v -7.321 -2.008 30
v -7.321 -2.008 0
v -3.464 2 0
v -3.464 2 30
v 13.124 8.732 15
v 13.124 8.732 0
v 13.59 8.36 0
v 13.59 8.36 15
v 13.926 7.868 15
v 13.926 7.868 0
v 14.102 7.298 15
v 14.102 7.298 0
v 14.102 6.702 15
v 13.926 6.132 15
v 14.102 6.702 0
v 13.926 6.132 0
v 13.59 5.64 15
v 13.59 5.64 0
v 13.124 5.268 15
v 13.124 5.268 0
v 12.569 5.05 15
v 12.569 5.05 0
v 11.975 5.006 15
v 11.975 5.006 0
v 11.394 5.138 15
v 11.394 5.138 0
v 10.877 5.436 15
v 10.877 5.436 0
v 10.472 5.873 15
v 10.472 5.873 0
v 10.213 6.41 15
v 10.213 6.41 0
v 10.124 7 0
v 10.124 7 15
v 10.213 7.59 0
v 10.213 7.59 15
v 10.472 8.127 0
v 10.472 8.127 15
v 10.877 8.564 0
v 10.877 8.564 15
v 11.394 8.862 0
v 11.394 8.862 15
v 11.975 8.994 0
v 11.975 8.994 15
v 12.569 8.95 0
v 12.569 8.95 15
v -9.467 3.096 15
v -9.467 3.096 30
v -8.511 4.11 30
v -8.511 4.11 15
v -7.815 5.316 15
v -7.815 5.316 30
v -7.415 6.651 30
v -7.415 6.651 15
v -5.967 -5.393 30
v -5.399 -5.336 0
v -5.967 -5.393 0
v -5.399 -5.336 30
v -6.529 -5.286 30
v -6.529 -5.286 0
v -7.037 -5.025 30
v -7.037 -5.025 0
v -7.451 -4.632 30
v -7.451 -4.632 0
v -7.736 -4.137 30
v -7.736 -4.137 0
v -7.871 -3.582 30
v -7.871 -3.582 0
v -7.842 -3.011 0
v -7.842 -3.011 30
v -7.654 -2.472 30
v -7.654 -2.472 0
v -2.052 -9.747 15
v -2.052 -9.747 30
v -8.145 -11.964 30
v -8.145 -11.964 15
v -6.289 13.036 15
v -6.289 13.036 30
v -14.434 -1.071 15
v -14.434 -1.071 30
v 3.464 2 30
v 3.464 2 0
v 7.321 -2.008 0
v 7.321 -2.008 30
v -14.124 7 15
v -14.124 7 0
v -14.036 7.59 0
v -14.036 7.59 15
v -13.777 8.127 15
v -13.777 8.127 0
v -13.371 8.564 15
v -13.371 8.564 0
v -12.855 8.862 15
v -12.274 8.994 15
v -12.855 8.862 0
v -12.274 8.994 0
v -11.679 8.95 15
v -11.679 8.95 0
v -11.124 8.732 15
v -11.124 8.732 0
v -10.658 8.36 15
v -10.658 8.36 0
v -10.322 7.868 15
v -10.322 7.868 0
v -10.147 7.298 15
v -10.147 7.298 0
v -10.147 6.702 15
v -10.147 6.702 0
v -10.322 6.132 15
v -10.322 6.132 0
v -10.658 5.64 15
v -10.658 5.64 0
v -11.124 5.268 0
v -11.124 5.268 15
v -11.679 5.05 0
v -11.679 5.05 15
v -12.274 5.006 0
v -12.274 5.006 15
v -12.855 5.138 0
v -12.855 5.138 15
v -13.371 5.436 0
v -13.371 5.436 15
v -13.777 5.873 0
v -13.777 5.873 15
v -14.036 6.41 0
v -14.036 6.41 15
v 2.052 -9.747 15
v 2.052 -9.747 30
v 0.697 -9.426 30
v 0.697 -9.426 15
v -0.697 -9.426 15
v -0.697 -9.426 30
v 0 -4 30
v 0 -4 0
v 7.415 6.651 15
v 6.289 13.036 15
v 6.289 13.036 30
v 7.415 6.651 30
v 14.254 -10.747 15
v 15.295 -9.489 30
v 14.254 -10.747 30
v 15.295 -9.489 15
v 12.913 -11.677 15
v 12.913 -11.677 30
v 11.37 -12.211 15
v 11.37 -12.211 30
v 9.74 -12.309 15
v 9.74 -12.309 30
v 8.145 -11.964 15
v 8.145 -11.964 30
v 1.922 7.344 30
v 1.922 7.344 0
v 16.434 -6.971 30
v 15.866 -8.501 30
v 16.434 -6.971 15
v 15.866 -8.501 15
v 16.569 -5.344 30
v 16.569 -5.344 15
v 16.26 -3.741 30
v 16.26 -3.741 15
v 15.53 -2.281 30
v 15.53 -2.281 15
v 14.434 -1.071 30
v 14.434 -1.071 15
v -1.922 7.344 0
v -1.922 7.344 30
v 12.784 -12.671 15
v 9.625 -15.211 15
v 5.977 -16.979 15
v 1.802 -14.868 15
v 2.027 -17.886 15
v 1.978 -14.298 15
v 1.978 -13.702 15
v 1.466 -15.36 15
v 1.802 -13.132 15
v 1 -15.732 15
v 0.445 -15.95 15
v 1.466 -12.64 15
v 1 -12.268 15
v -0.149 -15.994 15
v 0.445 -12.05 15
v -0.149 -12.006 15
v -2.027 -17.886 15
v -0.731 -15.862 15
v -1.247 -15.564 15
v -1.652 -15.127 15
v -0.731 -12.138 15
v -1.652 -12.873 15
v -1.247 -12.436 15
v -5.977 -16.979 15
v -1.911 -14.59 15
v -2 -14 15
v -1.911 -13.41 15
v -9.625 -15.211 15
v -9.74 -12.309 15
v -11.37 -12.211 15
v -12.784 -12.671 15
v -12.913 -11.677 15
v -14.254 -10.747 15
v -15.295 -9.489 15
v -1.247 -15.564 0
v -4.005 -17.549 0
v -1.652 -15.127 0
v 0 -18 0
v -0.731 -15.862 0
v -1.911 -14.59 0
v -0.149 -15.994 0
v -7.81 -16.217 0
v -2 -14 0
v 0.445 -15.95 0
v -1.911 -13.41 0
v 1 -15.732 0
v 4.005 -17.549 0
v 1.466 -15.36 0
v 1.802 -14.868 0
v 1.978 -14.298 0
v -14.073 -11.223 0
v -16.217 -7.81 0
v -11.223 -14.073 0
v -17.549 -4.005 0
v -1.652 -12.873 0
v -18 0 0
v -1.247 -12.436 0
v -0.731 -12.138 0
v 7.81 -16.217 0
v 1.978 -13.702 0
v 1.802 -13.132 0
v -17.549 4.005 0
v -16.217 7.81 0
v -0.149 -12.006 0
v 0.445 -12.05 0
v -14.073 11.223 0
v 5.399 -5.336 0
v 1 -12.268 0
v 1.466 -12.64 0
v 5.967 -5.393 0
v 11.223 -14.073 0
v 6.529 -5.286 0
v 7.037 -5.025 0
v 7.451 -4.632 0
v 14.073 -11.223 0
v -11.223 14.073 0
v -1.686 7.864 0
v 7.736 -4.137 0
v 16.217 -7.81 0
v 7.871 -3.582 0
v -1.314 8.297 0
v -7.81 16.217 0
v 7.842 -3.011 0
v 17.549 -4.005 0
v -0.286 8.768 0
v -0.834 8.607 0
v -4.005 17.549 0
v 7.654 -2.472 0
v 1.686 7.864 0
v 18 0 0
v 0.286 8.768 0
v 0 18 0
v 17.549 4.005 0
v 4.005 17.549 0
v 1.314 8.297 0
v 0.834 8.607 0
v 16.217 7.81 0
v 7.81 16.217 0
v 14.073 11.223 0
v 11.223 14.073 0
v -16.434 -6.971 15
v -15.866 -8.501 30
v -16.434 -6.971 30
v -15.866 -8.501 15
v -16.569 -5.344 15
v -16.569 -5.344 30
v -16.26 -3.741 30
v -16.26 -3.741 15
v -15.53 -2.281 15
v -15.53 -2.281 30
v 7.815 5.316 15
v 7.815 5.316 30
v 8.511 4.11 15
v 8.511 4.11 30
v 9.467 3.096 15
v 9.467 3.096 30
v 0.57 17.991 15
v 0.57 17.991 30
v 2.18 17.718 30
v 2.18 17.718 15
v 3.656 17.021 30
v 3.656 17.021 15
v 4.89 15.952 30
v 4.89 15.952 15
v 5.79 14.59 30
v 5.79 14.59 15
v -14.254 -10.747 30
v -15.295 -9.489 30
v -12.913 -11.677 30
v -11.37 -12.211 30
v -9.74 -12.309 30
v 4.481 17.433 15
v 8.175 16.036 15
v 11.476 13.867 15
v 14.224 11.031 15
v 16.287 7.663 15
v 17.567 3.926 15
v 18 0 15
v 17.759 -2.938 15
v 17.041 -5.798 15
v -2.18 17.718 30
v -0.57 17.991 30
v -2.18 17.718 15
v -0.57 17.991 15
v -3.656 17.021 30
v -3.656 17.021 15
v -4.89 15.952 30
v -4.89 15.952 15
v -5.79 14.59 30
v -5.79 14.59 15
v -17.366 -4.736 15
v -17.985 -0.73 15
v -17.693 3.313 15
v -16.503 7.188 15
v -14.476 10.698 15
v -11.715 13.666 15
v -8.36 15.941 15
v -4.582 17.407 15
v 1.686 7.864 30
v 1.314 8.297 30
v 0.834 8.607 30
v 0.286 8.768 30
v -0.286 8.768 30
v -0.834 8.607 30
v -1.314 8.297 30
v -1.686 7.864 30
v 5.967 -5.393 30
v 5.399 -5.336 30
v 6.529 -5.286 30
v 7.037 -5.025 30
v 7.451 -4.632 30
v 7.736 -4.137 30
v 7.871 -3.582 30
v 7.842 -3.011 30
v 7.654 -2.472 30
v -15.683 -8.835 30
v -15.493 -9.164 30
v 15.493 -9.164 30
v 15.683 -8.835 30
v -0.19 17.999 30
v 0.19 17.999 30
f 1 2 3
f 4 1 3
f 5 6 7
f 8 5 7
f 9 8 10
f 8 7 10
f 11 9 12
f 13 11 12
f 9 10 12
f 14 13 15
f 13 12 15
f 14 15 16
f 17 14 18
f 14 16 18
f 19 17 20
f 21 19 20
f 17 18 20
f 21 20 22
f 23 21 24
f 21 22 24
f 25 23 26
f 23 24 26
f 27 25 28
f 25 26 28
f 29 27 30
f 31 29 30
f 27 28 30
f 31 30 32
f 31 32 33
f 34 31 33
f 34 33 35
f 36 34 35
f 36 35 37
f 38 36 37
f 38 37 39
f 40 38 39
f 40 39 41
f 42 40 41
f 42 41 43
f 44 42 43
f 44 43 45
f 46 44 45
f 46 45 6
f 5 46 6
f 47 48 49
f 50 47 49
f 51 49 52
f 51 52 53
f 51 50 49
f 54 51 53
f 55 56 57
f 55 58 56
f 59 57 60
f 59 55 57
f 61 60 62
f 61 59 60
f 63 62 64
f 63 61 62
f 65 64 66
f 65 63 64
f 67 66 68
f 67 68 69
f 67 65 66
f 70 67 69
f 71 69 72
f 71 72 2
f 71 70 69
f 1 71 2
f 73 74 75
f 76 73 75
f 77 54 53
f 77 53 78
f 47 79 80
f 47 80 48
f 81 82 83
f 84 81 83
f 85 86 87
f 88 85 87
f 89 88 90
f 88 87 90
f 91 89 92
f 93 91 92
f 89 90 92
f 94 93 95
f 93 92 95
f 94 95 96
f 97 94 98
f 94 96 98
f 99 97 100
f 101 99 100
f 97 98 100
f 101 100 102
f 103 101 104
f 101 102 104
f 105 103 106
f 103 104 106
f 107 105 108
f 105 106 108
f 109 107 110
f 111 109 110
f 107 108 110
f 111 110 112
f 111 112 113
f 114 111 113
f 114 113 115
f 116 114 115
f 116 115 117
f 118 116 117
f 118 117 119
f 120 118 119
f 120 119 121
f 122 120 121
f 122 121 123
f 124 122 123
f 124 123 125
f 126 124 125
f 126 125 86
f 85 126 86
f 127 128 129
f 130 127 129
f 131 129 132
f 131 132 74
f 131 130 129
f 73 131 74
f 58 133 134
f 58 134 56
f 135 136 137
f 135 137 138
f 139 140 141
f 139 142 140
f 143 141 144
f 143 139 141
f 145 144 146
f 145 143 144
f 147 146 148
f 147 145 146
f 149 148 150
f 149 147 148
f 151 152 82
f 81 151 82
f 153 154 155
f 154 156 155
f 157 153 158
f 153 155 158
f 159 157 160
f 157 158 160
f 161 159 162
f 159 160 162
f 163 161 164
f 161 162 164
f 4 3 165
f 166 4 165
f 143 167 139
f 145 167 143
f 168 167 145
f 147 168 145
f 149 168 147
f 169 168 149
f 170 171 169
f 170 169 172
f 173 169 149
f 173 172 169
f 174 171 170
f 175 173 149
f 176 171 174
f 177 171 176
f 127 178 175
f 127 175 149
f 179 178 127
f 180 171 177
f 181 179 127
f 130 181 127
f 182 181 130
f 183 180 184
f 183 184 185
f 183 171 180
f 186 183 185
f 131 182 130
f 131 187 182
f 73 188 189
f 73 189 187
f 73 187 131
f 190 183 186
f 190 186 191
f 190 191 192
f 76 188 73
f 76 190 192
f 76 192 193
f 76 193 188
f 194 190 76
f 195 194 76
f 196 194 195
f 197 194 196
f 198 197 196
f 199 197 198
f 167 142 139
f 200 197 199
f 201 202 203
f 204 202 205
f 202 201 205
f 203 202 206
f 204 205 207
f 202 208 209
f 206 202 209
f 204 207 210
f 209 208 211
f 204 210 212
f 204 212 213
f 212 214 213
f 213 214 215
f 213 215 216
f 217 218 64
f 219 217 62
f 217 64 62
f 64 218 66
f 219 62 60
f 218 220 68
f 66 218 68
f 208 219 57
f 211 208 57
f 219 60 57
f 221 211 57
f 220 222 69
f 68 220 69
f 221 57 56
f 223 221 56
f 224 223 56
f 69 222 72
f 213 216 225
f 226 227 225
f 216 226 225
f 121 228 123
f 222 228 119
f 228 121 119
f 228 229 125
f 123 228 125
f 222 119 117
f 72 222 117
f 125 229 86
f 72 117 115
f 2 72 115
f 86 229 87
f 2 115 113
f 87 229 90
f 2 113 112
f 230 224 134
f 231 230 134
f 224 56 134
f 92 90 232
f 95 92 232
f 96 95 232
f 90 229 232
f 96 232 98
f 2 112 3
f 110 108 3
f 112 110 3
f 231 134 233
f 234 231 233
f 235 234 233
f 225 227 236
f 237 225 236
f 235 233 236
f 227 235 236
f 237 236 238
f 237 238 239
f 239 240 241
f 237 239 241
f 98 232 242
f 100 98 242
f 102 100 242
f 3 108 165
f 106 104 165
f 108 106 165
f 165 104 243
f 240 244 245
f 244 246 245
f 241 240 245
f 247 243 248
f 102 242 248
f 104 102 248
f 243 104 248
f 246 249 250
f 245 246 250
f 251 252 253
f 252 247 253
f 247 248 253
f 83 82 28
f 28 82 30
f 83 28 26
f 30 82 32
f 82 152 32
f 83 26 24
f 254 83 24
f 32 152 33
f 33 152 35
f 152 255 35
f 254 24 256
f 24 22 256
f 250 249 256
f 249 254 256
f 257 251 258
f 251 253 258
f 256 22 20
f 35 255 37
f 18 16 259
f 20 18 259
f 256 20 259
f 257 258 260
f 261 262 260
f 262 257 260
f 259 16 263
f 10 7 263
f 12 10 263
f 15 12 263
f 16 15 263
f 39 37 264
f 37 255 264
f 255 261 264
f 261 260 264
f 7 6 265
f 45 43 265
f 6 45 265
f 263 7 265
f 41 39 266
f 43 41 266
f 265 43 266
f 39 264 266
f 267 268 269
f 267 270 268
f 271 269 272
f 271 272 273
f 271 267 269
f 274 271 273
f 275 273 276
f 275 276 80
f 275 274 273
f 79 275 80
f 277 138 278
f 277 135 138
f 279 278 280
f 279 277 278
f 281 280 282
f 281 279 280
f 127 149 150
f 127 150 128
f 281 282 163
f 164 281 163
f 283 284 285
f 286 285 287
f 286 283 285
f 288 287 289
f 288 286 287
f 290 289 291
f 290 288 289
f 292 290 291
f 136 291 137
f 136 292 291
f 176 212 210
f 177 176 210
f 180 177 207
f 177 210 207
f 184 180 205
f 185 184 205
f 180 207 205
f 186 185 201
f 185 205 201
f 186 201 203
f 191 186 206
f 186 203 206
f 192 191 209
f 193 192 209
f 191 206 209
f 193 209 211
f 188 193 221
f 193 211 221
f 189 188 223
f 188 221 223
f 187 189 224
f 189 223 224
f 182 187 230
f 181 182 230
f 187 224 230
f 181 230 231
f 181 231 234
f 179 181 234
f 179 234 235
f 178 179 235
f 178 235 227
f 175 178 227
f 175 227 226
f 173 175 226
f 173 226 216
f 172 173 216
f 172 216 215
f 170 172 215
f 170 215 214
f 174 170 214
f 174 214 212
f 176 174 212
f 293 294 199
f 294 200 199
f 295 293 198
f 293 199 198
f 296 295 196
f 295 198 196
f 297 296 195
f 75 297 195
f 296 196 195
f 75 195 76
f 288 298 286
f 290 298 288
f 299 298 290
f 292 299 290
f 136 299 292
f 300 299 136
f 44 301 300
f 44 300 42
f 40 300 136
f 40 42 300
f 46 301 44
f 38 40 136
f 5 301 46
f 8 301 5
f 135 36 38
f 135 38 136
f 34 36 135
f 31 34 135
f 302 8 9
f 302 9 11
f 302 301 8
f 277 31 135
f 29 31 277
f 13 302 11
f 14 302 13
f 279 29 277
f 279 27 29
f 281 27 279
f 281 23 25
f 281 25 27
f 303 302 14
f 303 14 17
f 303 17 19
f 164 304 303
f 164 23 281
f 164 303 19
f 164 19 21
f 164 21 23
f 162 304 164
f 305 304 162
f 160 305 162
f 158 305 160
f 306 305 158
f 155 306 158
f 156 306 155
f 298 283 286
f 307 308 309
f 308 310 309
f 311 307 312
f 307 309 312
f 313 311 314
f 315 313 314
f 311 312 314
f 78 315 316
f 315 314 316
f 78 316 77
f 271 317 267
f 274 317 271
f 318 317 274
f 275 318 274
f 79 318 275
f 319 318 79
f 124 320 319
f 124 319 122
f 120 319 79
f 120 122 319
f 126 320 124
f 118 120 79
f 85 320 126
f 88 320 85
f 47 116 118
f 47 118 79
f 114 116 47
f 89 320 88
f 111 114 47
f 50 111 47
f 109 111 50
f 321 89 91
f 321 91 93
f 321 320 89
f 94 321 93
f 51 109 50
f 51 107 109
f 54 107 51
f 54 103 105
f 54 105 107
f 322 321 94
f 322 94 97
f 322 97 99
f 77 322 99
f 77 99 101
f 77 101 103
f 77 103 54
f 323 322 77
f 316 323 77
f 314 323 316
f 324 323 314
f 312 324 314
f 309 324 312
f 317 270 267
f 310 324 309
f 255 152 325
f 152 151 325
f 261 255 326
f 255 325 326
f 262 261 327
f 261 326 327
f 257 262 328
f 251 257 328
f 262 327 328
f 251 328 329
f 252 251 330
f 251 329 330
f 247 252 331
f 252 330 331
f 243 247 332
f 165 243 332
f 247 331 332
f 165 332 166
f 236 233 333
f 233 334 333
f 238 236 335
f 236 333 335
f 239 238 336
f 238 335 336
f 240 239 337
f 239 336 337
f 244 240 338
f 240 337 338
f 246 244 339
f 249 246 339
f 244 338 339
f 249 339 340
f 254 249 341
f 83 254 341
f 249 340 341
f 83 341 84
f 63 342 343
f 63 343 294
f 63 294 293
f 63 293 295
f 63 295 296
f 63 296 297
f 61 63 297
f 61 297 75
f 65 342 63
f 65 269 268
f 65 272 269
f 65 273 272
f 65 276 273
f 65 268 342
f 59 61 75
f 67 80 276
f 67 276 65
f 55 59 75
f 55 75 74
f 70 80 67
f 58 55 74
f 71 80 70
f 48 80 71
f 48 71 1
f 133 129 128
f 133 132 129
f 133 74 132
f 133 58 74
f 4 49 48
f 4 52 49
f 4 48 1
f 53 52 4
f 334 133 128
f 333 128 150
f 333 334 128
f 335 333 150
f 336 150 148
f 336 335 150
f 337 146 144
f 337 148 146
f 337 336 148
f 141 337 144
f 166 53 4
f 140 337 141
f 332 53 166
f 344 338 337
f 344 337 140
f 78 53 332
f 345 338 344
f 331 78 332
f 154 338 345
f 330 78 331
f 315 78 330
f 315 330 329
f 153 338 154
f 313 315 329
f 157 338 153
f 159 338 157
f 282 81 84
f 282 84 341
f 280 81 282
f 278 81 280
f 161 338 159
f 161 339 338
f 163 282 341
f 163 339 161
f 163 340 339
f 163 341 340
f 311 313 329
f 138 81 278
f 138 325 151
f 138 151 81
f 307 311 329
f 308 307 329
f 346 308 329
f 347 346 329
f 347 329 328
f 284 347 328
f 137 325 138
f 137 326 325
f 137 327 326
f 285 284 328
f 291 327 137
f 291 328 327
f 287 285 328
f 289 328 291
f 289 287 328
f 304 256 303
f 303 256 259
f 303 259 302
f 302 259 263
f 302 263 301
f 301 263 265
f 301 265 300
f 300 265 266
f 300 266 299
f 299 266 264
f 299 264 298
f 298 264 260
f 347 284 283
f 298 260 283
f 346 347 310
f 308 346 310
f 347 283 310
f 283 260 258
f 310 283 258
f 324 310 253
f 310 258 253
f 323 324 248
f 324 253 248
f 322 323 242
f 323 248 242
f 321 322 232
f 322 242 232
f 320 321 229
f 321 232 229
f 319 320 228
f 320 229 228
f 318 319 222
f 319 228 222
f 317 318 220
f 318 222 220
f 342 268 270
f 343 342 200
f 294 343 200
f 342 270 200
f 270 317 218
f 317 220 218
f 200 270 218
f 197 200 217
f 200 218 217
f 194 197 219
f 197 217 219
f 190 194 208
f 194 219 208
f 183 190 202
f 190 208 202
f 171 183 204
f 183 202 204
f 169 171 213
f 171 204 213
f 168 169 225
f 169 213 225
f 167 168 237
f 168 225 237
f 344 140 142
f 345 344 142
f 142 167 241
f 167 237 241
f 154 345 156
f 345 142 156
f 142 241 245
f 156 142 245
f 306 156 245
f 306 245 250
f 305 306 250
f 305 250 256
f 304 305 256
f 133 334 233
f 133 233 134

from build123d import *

# Parameters (mm, degrees)
SKETCH1_R                = 18
BOSS_EXTRUDE1_DEPTH      = 30
SKETCH2_R                = 2
CUT_EXTRUDE1_DEPTH       = 40
CUT_EXTRUDE2_DEPTH       = 15
FILLET2_R                = 6
CIRPATTERN3_COUNT        = 3
FILLET2_OF_CIRPATTERN3_R = 6
CUT_EXTRUDE3_START       = -30
CUT_EXTRUDE3_DEPTH       = 30
FILLET3_R                = 2


with BuildPart() as part:
    # Sketch1 → Boss-Extrude1 (new body)
    with BuildSketch(Plane.XY):
        Circle(SKETCH1_R)
    extrude(amount=BOSS_EXTRUDE1_DEPTH)

    # Sketch2 → Cut-Extrude1 (cut)
    with BuildSketch(Plane(origin=(0, 0, 0), x_dir=(-1, 0, 0), z_dir=(0, 0, -1))):
        with Locations((12.124355653, 7)):
            Circle(SKETCH2_R)
    cut_extrude1 = extrude(amount=-CUT_EXTRUDE1_DEPTH, mode=Mode.SUBTRACT)

    # Sketch3 → Cut-Extrude2 (cut)
    with BuildSketch(Plane.XY.offset(30)):
        Polygon((-15.686533479, 14.830127019), (-20.686533479, 6.169872981), (-17.60824379, -3.734936498), (-7.794228634, 4.5), (-5.569572007, 17.116654687), align=None)
    cut_extrude2 = extrude(amount=-CUT_EXTRUDE2_DEPTH, mode=Mode.SUBTRACT)

    # Fillet2
    fillet2_edges = [part.edges().sort_by_distance(p)[0] for p in [
        (-7.794228634, 4.5, 22.5),
        (-17.60824379, -3.734936498, 22.5),
        (-5.569572007, 17.116654687, 22.5),
    ]]
    fillet(fillet2_edges, radius=FILLET2_R)

    # CirPattern3: Cut-Extrude1, Cut-Extrude2 ×3 about axis
    cirpattern3_axis = Axis((0, 0, 0), (0, 0, 1))
    for i in range(1, CIRPATTERN3_COUNT):
        add(cut_extrude1.rotate(cirpattern3_axis, i * 360 / CIRPATTERN3_COUNT), mode=Mode.SUBTRACT)
        add(cut_extrude2.rotate(cirpattern3_axis, i * 360 / CIRPATTERN3_COUNT), mode=Mode.SUBTRACT)

    # Fillet2 of CirPattern3
    fillet2_of_cirpattern3_edges = [part.edges().sort_by_distance(p)[0] for p in [
        (0, -9, 22.5),
        (12.038671783, -13.381718189, 22.5),
        (-12.038671783, -13.381718189, 22.5),
        (7.794228634, 4.5, 22.5),
        (5.569572007, 17.116654687, 22.5),
        (17.60824379, -3.734936498, 22.5),
    ]]
    fillet(fillet2_of_cirpattern3_edges, radius=FILLET2_OF_CIRPATTERN3_R)

    # Sketch4 → Cut-Extrude3 (cut)
    with BuildSketch(Plane.XY.offset(30).offset(CUT_EXTRUDE3_START)):
        Polygon((-12.124355653, -7), (-3.464101615, 2), (0, 14), (3.464101615, 2), (12.124355653, -7), (0, -4), align=None)
    extrude(amount=CUT_EXTRUDE3_DEPTH, mode=Mode.SUBTRACT)

    # Fillet3
    fillet3_edges = [part.edges().sort_by_distance(p)[0] for p in [
        (12.124355653, -7, 15),
        (-12.124355653, -7, 15),
        (0, 14, 15),
    ]]
    fillet(fillet3_edges, radius=FILLET3_R)


solid = part.part
